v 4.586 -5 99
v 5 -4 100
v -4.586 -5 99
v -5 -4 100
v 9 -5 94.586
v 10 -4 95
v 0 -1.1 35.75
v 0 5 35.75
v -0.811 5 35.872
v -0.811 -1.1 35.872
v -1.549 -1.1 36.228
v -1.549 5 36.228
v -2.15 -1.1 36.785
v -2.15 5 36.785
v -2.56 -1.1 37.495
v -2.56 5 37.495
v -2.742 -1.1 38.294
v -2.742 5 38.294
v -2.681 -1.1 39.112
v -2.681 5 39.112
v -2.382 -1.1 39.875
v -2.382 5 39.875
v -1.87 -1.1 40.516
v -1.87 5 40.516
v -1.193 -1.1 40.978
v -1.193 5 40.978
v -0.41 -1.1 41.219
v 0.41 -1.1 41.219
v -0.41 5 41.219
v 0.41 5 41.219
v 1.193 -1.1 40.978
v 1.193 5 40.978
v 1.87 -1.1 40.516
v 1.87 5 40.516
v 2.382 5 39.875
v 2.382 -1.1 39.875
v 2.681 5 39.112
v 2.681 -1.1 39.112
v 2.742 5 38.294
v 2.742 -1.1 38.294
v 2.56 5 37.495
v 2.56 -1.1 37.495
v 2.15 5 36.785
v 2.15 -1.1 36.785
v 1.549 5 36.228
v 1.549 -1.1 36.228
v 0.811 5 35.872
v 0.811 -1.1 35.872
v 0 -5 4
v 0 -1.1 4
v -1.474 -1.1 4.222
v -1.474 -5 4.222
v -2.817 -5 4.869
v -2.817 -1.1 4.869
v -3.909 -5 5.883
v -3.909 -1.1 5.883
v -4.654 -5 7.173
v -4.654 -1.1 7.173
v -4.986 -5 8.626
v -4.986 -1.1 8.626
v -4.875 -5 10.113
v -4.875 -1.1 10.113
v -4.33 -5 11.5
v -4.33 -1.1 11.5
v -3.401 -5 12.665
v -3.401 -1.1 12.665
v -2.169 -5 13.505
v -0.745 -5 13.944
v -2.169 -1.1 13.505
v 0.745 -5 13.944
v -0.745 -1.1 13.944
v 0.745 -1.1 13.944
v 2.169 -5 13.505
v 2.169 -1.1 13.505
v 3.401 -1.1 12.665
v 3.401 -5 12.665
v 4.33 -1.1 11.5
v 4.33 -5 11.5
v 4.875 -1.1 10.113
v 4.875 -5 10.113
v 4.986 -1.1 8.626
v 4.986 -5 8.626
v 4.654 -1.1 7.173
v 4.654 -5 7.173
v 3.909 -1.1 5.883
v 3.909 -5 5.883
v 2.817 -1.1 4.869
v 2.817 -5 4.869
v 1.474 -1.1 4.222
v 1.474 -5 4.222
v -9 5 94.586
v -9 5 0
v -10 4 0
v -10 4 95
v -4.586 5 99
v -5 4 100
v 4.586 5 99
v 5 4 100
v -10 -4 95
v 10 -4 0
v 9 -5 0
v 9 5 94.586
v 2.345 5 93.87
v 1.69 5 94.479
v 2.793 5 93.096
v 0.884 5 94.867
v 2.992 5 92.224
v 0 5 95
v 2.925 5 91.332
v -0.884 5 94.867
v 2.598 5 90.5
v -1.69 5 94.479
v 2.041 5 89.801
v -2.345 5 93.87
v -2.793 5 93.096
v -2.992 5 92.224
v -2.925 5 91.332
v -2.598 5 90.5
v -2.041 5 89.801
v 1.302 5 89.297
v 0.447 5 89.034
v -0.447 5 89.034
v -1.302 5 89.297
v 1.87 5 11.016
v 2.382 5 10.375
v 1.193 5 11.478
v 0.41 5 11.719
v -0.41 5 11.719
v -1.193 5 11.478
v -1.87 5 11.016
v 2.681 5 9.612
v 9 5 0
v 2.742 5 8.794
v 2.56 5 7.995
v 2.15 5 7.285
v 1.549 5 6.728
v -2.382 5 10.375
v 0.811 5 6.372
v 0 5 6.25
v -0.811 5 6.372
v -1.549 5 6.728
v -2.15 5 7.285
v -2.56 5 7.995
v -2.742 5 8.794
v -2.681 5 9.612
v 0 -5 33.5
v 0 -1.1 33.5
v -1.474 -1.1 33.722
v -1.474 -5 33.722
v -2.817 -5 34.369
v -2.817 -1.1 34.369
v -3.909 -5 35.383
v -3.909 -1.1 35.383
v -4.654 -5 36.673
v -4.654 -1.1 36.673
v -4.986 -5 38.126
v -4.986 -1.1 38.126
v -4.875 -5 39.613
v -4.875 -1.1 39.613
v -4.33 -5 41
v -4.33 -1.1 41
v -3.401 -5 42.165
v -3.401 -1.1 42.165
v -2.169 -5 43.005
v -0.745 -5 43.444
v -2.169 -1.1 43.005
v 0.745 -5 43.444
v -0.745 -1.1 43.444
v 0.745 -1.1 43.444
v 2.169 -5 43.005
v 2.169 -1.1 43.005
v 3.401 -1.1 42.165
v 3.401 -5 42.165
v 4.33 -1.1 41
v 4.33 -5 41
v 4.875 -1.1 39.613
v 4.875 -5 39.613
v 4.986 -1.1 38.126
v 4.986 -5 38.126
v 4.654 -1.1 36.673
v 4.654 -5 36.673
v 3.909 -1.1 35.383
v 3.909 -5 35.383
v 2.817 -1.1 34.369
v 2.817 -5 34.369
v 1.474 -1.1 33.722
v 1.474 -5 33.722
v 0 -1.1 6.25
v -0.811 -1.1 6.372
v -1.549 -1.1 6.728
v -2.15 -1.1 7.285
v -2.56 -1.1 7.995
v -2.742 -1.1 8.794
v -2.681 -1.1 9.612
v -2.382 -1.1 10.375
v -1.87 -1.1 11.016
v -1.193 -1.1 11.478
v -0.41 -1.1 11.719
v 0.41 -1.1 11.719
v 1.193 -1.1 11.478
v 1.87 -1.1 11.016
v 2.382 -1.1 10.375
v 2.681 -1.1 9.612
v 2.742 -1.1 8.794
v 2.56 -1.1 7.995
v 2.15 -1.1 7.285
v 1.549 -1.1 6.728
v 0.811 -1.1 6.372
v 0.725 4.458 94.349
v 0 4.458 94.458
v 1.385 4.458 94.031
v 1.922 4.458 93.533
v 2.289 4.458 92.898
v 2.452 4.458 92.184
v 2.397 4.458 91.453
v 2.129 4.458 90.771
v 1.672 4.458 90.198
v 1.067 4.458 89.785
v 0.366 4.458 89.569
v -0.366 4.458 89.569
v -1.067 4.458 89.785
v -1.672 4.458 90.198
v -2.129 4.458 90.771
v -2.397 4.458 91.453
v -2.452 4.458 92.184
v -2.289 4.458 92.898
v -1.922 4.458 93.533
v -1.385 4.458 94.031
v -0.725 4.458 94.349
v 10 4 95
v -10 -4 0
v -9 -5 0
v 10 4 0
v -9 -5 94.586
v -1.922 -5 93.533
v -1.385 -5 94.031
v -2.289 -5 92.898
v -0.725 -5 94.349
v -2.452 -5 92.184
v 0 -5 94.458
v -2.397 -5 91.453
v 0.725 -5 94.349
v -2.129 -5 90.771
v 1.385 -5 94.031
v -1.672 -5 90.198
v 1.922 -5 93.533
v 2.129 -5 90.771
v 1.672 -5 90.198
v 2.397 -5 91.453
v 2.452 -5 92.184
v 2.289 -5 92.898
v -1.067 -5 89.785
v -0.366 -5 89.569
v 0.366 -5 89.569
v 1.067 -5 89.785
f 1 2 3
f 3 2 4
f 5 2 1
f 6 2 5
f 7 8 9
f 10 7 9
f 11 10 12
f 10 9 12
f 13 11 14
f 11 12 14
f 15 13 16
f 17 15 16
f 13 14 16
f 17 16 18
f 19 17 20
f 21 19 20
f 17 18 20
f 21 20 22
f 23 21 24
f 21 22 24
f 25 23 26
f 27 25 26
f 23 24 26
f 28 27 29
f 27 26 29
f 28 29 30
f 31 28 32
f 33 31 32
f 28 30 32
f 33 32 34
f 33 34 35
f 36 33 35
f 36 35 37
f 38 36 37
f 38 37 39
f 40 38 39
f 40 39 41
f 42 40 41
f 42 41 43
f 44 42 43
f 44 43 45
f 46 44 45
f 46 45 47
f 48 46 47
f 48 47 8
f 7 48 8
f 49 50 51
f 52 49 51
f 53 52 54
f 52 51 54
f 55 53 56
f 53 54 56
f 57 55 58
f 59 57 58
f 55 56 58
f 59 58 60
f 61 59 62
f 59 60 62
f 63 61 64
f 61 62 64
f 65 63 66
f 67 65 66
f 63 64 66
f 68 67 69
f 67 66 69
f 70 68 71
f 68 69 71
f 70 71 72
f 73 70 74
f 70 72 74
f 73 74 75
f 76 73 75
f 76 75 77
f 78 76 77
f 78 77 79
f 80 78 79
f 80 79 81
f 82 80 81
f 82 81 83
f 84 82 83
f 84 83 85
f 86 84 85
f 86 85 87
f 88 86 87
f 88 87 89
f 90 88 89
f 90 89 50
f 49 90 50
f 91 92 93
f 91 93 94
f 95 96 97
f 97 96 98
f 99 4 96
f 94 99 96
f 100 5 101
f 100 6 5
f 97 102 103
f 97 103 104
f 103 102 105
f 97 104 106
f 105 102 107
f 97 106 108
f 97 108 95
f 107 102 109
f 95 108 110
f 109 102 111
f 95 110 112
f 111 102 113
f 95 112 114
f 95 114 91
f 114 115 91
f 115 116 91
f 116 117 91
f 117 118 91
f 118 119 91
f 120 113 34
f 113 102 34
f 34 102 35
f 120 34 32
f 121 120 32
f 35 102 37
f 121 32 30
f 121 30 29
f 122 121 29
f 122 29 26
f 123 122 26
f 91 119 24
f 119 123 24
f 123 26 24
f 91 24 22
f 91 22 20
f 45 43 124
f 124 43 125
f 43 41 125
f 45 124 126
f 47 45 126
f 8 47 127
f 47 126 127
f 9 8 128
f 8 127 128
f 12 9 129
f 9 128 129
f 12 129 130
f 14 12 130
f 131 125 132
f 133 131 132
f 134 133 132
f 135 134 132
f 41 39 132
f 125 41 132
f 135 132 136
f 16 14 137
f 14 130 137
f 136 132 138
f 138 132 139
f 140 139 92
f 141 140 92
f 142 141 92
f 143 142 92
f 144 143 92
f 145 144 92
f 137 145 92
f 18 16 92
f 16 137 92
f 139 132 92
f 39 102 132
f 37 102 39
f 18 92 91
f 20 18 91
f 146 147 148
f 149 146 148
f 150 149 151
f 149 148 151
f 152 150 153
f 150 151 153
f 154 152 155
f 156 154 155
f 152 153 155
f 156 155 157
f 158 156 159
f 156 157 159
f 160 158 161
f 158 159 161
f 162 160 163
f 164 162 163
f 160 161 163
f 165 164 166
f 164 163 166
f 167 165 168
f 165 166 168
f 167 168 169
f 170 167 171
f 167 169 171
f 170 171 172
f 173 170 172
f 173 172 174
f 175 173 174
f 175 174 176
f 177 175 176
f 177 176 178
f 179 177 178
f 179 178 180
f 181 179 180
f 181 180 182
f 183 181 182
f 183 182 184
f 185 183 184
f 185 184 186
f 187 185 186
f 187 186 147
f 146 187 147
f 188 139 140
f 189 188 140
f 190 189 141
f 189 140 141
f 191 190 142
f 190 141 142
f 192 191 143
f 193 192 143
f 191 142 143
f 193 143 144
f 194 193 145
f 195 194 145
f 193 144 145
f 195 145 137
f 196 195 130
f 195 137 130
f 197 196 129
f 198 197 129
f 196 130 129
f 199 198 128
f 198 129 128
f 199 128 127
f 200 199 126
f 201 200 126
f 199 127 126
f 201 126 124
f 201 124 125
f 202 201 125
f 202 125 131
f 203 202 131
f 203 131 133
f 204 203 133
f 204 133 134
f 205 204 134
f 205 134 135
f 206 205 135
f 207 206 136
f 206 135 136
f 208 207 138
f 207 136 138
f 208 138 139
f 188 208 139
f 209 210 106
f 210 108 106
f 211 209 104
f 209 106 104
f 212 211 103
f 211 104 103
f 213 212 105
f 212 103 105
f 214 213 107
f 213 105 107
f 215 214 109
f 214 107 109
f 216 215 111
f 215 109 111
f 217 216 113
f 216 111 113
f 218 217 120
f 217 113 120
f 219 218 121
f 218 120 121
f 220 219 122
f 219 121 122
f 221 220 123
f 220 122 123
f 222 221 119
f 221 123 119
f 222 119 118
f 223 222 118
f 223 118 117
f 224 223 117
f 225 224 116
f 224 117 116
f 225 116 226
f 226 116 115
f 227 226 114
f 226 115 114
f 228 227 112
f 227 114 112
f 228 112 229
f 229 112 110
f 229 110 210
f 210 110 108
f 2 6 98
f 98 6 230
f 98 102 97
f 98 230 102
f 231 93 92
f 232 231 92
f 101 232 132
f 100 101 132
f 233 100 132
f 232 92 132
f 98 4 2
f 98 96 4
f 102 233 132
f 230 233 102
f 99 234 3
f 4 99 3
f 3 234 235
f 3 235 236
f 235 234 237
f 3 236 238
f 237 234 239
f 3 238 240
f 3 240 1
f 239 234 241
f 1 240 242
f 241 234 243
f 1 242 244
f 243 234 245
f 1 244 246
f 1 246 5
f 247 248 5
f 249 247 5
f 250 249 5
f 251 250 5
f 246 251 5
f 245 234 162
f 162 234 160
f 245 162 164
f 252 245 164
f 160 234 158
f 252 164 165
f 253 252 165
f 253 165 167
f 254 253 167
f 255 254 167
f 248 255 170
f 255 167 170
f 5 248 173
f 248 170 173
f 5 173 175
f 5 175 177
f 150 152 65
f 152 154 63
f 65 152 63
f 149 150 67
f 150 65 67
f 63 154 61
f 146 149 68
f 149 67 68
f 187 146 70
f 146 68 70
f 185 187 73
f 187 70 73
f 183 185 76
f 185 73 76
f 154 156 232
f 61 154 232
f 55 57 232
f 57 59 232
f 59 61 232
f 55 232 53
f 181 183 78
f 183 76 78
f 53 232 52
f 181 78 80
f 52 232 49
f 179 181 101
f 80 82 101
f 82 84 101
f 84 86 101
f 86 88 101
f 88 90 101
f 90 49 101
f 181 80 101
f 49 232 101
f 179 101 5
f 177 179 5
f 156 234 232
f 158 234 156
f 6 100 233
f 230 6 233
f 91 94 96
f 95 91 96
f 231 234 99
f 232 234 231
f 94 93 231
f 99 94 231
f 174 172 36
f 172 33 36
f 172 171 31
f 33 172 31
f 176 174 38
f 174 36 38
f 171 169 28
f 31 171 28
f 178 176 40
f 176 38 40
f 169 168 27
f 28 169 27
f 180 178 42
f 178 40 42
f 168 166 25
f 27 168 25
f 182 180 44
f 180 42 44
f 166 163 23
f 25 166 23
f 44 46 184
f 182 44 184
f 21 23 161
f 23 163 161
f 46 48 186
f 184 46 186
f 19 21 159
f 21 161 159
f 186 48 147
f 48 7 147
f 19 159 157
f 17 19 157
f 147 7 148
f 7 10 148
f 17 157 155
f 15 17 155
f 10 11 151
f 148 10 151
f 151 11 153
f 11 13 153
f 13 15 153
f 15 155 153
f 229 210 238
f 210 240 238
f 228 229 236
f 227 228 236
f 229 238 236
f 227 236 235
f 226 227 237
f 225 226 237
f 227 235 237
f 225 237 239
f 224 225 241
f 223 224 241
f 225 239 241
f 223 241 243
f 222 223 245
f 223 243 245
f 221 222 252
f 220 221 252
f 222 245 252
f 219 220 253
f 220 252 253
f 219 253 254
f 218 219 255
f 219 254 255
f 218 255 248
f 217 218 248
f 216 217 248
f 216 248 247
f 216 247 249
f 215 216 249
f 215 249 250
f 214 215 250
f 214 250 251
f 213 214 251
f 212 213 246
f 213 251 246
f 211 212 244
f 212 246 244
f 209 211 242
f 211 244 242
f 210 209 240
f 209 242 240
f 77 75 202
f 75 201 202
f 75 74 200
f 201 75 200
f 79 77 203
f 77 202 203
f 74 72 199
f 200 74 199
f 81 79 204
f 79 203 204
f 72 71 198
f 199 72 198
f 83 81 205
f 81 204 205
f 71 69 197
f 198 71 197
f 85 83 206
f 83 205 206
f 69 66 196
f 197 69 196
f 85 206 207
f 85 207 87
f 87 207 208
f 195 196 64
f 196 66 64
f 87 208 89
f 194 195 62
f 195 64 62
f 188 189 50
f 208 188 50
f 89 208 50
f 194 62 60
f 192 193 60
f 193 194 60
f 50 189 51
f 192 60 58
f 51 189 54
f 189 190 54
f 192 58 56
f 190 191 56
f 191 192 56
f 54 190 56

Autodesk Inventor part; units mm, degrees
ref_plane "YZ Plane" through (0, 0, 0) normal (1, 0, 0) x (0, 1, 0)
ref_plane "XZ Plane" through (0, 0, 0) normal (0, 1, 0) x (-1, 0, 0)
ref_plane "XY Plane" through (0, 0, 0) normal (0, 0, 1) x (1, 0, 0)
sketch "Skizze8" plane through (0, 0, 0) normal (0, 0, 1) x (1, 0, 0)
  line L0 (-10, -5) -> (10, -5)
  line L1 (10, -5) -> (10, 5)
  line L2 (10, 5) -> (-10, 5)
  line L3 (-10, 5) -> (-10, -5)
  line L4 (-10, -5) -> (10, 5) construction
  line L5 (10, -5) -> (-10, 5) construction
  point P0 (0, 0)
  dimension "d49" = 10
  dimension "d50" = 20
extrude "Grundkörper" add sketch "Skizze8" along normal blind 100
sketch "Skizze9" plane through (-10, -5, 0) normal (0, -1, 0) x (1, 0, 0)
  line L0 (10, 120) -> (10, -20) construction
  line L1 (0, 0) -> (20, 0) construction
  point P0 (10, 0)
  point P1 (10, 9)
  point P2 (10, 38.5)
  dimension "d53" = 9
  dimension "d54" = 38.5
hole "DIN7984_M5" at (0, -5, 9) at (0, -5, 38.5) direction (0, 1, 0) diameter 5.5 end through all counterbore diameter 10 counterbore depth 3.9
sketch "Skizze10" plane through (-10, 5, 0) normal (0, 1, 0) x (1, 0, 0)
  line L0 (10, 20) -> (10, -120) construction
  line L1 (20, -100) -> (0, -100) projected
  point P0 (10, 0)
  point P1 (10, -92)
  dimension "d62" = 8
hole "M6" at (0, 5, 92) direction (0, -1, 0) diameter 4.917 end through all countersink diameter 6 countersink angle 90 thread size "M6x1" class "6H" standard "ISO Metric profile"
chamfer "Fase_Abschraegung" distance 5 angle 45 2 edges at (-10, 0, 100) (10, 0, 100)
chamfer "Fase_Allgemein" distance 1 angle 45 10 edges at (-10, -5, 47.5) (-7.5, -5, 97.5) (0, -5, 100) (7.5, -5, 97.5) (10, -5, 47.5) (-10, 5, 47.5) (-7.5, 5, 97.5) (0, 5, 100) (7.5, 5, 97.5) (10, 5, 47.5)
properties part number "200-60-DIFFERENTIAL-BAR-01" material "Aluminium 6061"
